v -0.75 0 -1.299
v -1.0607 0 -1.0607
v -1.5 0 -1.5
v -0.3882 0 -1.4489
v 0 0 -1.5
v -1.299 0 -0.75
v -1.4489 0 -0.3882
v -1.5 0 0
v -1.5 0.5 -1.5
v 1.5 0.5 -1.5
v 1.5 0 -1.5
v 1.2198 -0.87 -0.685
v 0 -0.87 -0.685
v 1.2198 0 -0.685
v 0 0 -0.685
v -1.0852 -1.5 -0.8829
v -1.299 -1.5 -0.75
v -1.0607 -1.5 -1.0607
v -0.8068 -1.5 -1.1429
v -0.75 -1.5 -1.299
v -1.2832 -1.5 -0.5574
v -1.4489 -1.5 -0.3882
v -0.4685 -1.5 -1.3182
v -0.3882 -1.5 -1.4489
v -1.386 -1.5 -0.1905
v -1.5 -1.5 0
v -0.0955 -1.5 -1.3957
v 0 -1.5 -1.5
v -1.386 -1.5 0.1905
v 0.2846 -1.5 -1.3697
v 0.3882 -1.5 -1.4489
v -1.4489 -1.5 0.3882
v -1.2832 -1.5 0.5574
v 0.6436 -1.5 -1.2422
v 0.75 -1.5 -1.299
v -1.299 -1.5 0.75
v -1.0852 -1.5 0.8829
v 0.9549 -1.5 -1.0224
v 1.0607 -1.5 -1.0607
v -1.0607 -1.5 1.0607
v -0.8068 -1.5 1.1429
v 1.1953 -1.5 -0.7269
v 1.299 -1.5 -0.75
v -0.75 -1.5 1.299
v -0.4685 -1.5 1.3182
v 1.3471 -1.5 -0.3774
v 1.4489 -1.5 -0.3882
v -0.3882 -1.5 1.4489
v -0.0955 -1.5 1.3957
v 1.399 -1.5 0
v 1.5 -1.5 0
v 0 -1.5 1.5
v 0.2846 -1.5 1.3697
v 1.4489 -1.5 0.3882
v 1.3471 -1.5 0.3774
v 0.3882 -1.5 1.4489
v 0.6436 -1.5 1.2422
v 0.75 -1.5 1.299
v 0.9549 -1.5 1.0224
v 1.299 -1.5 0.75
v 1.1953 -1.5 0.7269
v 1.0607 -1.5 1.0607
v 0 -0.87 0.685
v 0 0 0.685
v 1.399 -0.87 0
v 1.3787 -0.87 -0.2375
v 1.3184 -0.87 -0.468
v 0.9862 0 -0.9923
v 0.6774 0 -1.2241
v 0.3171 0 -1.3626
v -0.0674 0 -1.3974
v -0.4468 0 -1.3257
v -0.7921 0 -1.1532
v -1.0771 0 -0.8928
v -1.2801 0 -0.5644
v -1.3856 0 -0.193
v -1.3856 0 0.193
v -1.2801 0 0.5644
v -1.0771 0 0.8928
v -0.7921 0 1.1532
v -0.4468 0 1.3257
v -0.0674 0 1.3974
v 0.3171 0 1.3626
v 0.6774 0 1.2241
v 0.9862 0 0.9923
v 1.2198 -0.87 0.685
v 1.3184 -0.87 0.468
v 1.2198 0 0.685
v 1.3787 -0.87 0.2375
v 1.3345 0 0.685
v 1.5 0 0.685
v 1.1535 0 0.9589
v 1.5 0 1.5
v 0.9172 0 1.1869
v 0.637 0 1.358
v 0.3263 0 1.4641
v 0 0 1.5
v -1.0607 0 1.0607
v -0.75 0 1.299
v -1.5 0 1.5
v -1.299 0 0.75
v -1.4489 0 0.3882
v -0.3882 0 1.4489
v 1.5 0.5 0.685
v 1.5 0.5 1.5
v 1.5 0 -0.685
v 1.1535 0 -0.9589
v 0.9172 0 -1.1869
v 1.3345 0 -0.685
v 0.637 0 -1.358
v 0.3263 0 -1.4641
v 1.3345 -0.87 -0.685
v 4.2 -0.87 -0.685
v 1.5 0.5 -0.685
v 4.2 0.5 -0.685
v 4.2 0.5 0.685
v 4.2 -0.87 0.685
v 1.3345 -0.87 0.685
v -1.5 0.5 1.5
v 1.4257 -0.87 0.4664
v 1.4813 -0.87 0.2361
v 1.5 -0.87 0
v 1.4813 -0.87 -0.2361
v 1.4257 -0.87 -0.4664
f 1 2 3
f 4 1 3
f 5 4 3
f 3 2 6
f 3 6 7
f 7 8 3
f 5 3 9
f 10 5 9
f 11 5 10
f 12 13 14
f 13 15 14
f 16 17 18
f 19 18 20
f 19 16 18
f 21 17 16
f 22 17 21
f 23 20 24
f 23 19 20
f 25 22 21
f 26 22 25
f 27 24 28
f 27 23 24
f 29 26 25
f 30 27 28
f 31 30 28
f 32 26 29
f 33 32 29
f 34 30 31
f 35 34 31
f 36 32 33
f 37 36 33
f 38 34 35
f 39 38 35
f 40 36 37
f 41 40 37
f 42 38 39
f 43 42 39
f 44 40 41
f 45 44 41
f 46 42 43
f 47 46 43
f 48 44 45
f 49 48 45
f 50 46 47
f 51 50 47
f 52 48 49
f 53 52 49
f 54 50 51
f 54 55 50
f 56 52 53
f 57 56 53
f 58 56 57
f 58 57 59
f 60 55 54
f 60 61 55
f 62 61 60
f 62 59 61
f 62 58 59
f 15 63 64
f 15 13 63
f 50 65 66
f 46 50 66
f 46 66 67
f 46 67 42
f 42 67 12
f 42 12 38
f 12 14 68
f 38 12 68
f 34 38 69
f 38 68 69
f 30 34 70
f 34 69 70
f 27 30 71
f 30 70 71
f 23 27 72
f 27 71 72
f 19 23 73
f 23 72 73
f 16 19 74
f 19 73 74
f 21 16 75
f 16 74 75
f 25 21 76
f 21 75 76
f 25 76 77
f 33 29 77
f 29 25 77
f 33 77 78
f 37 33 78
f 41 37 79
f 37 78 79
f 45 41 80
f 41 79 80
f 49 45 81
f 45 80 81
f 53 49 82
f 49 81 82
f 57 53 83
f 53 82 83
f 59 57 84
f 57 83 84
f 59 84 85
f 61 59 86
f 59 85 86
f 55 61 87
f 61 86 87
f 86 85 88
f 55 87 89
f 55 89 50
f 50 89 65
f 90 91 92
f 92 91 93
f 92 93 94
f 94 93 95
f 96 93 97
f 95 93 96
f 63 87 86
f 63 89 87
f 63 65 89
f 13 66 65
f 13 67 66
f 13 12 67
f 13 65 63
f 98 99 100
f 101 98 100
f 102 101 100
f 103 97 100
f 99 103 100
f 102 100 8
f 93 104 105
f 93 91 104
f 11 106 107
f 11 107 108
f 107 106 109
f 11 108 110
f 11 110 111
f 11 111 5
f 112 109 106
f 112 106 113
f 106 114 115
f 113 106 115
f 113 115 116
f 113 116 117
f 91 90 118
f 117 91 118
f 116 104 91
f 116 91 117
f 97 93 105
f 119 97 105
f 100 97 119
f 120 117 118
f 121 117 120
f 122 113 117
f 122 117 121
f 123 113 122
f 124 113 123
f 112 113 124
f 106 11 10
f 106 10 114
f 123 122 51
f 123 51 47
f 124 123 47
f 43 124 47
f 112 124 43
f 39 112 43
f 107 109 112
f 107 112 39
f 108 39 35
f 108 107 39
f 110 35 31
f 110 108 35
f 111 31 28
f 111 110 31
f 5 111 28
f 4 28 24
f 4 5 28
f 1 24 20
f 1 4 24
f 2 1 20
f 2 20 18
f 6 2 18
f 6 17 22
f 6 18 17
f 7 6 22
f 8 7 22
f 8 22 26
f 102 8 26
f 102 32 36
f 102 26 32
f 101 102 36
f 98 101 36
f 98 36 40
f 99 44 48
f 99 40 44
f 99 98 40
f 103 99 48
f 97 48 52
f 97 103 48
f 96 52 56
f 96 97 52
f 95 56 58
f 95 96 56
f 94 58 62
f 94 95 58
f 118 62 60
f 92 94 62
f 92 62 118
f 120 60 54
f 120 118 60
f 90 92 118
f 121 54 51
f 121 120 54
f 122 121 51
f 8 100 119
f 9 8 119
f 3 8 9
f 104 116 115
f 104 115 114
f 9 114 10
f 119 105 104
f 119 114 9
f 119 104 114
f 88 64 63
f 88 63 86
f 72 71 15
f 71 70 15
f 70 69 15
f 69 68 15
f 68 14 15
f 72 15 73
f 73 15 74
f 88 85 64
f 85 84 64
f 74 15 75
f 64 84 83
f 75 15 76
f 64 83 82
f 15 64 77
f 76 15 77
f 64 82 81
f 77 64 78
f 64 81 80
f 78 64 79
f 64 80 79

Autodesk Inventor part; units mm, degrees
ref_plane "YZ Plane" through (0, 0, 0) normal (1, 0, 0) x (0, 1, 0)
ref_plane "XZ Plane" through (0, 0, 0) normal (0, 1, 0) x (-1, 0, 0)
ref_plane "XY Plane" through (0, 0, 0) normal (0, 0, 1) x (1, 0, 0)
sketch "Sketch1" plane through (0, 0, 0) normal (0, 1, 0) x (-1, 0, 0)
  line L0 (-1.5, 1.5) -> (1.5, 1.5)
  line L1 (1.5, 1.5) -> (1.5, -1.5)
  line L2 (1.5, -1.5) -> (-1.5, -1.5)
  line L3 (-1.5, -1.5) -> (-1.5, 1.5)
  point P0 (0, 0)
  dimension "d0" = 3
  dimension "d1" = 3
  dimension "d8" = 1.5
  dimension "d9" = 1.5
extrude "Extrusion1" add sketch "Sketch1" along normal blind 0.5
sketch "Sketch2" plane through (0, 0, 0) normal (0, -1, 0) x (1, 0, 0)
  line L0 (1.5, -1.5) -> (1.5, 1.5) projected
  circle A0 centre (0, 0) radius 1.5
  circle A1 centre (0, 0) radius 1.399
  dimension "d4" = 2.7979
  dimension "d5" = 3
extrude "Extrusion2" add sketch "Sketch2" along normal blind 1.5
sketch "Sketch3" plane through (0, 0, 0) normal (0, 0, 1) x (1, 0, 0)
  line L0 (0, 0.5) -> (4.2, 0.5)
  line L1 (4.2, 0.5) -> (4.2, -0.87)
  line L2 (4.2, -0.87) -> (0, -0.87)
  line L3 (0, -0.87) -> (0, 0.5)
  line L4 (-1.5, 0) -> (-1.5, 0.5) projected
  line L5 (-1.5, 0.5) -> (1.5, 0.5) projected
  point P0 (0, 0)
  dimension "d10" = 5.7
  dimension "d11" = 1.37
  dimension "d12" = 0
extrude "Extrusion3" add sketch "Sketch3" along normal mid plane 1.37
sketch "Sketch4" plane through (0, 0.5, 0) normal (0, 1, 0) x (1, 0, 0)
  line L0 (1.5, 0.685) -> (1.5, 1.5) projected
  line L1 (1.5, 1.5) -> (-1.5, 1.5) projected
  line L2 (-1.5, 1.5) -> (-1.5, -1.5) projected
  line L3 (-1.5, -1.5) -> (1.5, -1.5) projected
  line L4 (1.5, -1.5) -> (1.5, -0.685) projected
  line L5 (4.2, -0.685) -> (1.5, -0.685) projected
  line L6 (4.2, -0.685) -> (4.2, 0.685) projected
  line L7 (1.5, 0.685) -> (4.2, 0.685) projected
  circle A0 centre (4.0858, 4.4759) radius 4.5
  circle A1 centre (4.0858, 4.4759) radius 4.1575
  circle A2 centre (4.0858, 4.4759) radius 4.8425
  circle A3 centre (4.2, -4.5313) radius 4.5
  circle A4 centre (4.2, -4.5313) radius 4.1575
  circle A5 centre (4.2, -4.5313) radius 4.8425
  point P0 (0, 0)
  dimension "d15" = 9
  dimension "d16" = 9.685
  dimension "d17" = 8.315
  dimension "d18" = 9
  dimension "d19" = 9.685
  dimension "d20" = 8.315
properties part number "UMCC_Plug"
